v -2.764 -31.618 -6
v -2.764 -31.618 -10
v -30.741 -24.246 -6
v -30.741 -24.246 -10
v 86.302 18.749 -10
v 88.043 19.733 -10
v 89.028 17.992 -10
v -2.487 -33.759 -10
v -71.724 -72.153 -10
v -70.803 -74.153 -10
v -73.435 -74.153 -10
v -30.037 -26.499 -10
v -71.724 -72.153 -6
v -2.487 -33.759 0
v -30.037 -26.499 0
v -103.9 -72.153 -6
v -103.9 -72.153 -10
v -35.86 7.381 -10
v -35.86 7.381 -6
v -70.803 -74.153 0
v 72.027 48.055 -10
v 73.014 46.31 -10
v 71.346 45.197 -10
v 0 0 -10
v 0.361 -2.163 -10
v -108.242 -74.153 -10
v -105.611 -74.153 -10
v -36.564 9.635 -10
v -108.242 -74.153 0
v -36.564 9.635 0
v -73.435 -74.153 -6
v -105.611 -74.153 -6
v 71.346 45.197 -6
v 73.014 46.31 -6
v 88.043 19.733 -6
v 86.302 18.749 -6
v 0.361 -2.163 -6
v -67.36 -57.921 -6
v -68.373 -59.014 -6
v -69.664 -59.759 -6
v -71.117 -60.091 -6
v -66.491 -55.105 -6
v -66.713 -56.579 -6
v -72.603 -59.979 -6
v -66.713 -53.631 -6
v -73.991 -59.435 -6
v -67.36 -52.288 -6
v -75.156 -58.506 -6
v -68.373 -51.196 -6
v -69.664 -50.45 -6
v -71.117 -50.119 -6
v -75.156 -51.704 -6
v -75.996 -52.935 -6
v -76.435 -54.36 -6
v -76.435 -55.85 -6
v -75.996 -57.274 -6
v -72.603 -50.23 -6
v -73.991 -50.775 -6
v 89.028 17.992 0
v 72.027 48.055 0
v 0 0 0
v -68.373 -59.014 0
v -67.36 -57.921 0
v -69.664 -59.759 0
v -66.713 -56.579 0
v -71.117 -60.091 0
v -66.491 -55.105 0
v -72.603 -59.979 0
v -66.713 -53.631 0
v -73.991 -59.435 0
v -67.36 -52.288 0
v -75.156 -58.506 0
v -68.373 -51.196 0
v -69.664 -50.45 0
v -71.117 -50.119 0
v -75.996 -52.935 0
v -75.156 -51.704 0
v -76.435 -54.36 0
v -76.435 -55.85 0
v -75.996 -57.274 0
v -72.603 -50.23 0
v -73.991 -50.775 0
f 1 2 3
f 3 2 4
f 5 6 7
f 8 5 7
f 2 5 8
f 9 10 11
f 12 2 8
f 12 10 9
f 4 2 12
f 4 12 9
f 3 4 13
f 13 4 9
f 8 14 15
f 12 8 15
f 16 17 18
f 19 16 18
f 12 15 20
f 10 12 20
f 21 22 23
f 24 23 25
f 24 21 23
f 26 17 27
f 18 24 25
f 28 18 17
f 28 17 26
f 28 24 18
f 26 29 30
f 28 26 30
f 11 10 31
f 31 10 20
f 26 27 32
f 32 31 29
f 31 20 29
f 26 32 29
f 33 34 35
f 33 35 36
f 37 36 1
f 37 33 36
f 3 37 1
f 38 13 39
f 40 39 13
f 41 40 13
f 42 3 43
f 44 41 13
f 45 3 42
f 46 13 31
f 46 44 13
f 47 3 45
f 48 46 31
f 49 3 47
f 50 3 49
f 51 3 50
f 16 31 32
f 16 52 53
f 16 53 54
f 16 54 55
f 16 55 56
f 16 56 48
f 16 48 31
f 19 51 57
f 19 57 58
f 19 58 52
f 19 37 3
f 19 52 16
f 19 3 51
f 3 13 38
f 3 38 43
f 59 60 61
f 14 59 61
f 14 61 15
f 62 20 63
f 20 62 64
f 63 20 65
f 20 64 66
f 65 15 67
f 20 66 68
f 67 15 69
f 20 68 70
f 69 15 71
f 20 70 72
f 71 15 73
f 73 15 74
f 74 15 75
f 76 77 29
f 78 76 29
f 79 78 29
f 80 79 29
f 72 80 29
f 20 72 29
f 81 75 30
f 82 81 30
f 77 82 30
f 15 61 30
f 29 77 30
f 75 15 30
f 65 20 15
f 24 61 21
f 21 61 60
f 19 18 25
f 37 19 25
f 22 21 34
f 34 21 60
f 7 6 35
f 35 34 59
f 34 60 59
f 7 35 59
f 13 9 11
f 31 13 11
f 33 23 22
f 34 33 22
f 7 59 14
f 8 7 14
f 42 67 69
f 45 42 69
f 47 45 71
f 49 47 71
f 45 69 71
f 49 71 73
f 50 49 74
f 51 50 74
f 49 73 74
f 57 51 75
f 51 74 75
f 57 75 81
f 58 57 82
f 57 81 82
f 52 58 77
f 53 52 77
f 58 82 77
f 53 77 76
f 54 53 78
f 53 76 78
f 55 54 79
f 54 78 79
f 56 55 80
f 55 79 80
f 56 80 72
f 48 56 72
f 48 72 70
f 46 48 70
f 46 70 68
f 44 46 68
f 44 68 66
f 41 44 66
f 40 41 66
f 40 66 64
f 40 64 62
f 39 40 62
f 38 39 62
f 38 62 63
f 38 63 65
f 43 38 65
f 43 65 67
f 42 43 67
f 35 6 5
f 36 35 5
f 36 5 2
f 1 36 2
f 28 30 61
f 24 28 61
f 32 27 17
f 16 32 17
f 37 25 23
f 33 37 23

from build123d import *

# Parameters (mm, degrees)
SKETCH1_R           = 5
BOSS_EXTRUDE1_DEPTH = 10
CUT_EXTRUDE1_DEPTH  = 4


with BuildPart() as part:
    # Sketch1 → Boss-Extrude1 (new body)
    with BuildSketch(Plane.XY):
        Polygon((72.027126309, 48.055346158), (89.027642078, 17.992338813), (-2.487468662, -33.759106586), (-30.037099765, -26.499406498), (-70.803107952, -74.152822461), (-108.242490343, -74.152822461), (-36.564435859, 9.635222963), (0, 0), align=None)
        with Locations((-71.49077455, -55.104728104)):
            Circle(SKETCH1_R, mode=Mode.SUBTRACT)
    extrude(amount=-BOSS_EXTRUDE1_DEPTH)

    # Sketch2 → Cut-Extrude1 (cut)
    with BuildSketch(Plane(origin=(0, 0, -10), x_dir=(-1, 0, 0), z_dir=(0, 0, -1))):
        Polygon((-71.346056645, 45.196672444), (-73.014288261, 46.309689884), (-88.043159753, 19.733256545), (-86.30224202, 18.74877422), (2.764141771, -31.617925447), (30.741045074, -24.245633361), (71.72414825, -72.152822461), (73.43508575, -74.152822461), (105.610512545, -74.152822461), (103.899575045, -72.152822461), (35.86049055, 7.381449825), (-0.361020517, -2.163407821), align=None)
    extrude(amount=-CUT_EXTRUDE1_DEPTH, mode=Mode.SUBTRACT)


solid = part.part
